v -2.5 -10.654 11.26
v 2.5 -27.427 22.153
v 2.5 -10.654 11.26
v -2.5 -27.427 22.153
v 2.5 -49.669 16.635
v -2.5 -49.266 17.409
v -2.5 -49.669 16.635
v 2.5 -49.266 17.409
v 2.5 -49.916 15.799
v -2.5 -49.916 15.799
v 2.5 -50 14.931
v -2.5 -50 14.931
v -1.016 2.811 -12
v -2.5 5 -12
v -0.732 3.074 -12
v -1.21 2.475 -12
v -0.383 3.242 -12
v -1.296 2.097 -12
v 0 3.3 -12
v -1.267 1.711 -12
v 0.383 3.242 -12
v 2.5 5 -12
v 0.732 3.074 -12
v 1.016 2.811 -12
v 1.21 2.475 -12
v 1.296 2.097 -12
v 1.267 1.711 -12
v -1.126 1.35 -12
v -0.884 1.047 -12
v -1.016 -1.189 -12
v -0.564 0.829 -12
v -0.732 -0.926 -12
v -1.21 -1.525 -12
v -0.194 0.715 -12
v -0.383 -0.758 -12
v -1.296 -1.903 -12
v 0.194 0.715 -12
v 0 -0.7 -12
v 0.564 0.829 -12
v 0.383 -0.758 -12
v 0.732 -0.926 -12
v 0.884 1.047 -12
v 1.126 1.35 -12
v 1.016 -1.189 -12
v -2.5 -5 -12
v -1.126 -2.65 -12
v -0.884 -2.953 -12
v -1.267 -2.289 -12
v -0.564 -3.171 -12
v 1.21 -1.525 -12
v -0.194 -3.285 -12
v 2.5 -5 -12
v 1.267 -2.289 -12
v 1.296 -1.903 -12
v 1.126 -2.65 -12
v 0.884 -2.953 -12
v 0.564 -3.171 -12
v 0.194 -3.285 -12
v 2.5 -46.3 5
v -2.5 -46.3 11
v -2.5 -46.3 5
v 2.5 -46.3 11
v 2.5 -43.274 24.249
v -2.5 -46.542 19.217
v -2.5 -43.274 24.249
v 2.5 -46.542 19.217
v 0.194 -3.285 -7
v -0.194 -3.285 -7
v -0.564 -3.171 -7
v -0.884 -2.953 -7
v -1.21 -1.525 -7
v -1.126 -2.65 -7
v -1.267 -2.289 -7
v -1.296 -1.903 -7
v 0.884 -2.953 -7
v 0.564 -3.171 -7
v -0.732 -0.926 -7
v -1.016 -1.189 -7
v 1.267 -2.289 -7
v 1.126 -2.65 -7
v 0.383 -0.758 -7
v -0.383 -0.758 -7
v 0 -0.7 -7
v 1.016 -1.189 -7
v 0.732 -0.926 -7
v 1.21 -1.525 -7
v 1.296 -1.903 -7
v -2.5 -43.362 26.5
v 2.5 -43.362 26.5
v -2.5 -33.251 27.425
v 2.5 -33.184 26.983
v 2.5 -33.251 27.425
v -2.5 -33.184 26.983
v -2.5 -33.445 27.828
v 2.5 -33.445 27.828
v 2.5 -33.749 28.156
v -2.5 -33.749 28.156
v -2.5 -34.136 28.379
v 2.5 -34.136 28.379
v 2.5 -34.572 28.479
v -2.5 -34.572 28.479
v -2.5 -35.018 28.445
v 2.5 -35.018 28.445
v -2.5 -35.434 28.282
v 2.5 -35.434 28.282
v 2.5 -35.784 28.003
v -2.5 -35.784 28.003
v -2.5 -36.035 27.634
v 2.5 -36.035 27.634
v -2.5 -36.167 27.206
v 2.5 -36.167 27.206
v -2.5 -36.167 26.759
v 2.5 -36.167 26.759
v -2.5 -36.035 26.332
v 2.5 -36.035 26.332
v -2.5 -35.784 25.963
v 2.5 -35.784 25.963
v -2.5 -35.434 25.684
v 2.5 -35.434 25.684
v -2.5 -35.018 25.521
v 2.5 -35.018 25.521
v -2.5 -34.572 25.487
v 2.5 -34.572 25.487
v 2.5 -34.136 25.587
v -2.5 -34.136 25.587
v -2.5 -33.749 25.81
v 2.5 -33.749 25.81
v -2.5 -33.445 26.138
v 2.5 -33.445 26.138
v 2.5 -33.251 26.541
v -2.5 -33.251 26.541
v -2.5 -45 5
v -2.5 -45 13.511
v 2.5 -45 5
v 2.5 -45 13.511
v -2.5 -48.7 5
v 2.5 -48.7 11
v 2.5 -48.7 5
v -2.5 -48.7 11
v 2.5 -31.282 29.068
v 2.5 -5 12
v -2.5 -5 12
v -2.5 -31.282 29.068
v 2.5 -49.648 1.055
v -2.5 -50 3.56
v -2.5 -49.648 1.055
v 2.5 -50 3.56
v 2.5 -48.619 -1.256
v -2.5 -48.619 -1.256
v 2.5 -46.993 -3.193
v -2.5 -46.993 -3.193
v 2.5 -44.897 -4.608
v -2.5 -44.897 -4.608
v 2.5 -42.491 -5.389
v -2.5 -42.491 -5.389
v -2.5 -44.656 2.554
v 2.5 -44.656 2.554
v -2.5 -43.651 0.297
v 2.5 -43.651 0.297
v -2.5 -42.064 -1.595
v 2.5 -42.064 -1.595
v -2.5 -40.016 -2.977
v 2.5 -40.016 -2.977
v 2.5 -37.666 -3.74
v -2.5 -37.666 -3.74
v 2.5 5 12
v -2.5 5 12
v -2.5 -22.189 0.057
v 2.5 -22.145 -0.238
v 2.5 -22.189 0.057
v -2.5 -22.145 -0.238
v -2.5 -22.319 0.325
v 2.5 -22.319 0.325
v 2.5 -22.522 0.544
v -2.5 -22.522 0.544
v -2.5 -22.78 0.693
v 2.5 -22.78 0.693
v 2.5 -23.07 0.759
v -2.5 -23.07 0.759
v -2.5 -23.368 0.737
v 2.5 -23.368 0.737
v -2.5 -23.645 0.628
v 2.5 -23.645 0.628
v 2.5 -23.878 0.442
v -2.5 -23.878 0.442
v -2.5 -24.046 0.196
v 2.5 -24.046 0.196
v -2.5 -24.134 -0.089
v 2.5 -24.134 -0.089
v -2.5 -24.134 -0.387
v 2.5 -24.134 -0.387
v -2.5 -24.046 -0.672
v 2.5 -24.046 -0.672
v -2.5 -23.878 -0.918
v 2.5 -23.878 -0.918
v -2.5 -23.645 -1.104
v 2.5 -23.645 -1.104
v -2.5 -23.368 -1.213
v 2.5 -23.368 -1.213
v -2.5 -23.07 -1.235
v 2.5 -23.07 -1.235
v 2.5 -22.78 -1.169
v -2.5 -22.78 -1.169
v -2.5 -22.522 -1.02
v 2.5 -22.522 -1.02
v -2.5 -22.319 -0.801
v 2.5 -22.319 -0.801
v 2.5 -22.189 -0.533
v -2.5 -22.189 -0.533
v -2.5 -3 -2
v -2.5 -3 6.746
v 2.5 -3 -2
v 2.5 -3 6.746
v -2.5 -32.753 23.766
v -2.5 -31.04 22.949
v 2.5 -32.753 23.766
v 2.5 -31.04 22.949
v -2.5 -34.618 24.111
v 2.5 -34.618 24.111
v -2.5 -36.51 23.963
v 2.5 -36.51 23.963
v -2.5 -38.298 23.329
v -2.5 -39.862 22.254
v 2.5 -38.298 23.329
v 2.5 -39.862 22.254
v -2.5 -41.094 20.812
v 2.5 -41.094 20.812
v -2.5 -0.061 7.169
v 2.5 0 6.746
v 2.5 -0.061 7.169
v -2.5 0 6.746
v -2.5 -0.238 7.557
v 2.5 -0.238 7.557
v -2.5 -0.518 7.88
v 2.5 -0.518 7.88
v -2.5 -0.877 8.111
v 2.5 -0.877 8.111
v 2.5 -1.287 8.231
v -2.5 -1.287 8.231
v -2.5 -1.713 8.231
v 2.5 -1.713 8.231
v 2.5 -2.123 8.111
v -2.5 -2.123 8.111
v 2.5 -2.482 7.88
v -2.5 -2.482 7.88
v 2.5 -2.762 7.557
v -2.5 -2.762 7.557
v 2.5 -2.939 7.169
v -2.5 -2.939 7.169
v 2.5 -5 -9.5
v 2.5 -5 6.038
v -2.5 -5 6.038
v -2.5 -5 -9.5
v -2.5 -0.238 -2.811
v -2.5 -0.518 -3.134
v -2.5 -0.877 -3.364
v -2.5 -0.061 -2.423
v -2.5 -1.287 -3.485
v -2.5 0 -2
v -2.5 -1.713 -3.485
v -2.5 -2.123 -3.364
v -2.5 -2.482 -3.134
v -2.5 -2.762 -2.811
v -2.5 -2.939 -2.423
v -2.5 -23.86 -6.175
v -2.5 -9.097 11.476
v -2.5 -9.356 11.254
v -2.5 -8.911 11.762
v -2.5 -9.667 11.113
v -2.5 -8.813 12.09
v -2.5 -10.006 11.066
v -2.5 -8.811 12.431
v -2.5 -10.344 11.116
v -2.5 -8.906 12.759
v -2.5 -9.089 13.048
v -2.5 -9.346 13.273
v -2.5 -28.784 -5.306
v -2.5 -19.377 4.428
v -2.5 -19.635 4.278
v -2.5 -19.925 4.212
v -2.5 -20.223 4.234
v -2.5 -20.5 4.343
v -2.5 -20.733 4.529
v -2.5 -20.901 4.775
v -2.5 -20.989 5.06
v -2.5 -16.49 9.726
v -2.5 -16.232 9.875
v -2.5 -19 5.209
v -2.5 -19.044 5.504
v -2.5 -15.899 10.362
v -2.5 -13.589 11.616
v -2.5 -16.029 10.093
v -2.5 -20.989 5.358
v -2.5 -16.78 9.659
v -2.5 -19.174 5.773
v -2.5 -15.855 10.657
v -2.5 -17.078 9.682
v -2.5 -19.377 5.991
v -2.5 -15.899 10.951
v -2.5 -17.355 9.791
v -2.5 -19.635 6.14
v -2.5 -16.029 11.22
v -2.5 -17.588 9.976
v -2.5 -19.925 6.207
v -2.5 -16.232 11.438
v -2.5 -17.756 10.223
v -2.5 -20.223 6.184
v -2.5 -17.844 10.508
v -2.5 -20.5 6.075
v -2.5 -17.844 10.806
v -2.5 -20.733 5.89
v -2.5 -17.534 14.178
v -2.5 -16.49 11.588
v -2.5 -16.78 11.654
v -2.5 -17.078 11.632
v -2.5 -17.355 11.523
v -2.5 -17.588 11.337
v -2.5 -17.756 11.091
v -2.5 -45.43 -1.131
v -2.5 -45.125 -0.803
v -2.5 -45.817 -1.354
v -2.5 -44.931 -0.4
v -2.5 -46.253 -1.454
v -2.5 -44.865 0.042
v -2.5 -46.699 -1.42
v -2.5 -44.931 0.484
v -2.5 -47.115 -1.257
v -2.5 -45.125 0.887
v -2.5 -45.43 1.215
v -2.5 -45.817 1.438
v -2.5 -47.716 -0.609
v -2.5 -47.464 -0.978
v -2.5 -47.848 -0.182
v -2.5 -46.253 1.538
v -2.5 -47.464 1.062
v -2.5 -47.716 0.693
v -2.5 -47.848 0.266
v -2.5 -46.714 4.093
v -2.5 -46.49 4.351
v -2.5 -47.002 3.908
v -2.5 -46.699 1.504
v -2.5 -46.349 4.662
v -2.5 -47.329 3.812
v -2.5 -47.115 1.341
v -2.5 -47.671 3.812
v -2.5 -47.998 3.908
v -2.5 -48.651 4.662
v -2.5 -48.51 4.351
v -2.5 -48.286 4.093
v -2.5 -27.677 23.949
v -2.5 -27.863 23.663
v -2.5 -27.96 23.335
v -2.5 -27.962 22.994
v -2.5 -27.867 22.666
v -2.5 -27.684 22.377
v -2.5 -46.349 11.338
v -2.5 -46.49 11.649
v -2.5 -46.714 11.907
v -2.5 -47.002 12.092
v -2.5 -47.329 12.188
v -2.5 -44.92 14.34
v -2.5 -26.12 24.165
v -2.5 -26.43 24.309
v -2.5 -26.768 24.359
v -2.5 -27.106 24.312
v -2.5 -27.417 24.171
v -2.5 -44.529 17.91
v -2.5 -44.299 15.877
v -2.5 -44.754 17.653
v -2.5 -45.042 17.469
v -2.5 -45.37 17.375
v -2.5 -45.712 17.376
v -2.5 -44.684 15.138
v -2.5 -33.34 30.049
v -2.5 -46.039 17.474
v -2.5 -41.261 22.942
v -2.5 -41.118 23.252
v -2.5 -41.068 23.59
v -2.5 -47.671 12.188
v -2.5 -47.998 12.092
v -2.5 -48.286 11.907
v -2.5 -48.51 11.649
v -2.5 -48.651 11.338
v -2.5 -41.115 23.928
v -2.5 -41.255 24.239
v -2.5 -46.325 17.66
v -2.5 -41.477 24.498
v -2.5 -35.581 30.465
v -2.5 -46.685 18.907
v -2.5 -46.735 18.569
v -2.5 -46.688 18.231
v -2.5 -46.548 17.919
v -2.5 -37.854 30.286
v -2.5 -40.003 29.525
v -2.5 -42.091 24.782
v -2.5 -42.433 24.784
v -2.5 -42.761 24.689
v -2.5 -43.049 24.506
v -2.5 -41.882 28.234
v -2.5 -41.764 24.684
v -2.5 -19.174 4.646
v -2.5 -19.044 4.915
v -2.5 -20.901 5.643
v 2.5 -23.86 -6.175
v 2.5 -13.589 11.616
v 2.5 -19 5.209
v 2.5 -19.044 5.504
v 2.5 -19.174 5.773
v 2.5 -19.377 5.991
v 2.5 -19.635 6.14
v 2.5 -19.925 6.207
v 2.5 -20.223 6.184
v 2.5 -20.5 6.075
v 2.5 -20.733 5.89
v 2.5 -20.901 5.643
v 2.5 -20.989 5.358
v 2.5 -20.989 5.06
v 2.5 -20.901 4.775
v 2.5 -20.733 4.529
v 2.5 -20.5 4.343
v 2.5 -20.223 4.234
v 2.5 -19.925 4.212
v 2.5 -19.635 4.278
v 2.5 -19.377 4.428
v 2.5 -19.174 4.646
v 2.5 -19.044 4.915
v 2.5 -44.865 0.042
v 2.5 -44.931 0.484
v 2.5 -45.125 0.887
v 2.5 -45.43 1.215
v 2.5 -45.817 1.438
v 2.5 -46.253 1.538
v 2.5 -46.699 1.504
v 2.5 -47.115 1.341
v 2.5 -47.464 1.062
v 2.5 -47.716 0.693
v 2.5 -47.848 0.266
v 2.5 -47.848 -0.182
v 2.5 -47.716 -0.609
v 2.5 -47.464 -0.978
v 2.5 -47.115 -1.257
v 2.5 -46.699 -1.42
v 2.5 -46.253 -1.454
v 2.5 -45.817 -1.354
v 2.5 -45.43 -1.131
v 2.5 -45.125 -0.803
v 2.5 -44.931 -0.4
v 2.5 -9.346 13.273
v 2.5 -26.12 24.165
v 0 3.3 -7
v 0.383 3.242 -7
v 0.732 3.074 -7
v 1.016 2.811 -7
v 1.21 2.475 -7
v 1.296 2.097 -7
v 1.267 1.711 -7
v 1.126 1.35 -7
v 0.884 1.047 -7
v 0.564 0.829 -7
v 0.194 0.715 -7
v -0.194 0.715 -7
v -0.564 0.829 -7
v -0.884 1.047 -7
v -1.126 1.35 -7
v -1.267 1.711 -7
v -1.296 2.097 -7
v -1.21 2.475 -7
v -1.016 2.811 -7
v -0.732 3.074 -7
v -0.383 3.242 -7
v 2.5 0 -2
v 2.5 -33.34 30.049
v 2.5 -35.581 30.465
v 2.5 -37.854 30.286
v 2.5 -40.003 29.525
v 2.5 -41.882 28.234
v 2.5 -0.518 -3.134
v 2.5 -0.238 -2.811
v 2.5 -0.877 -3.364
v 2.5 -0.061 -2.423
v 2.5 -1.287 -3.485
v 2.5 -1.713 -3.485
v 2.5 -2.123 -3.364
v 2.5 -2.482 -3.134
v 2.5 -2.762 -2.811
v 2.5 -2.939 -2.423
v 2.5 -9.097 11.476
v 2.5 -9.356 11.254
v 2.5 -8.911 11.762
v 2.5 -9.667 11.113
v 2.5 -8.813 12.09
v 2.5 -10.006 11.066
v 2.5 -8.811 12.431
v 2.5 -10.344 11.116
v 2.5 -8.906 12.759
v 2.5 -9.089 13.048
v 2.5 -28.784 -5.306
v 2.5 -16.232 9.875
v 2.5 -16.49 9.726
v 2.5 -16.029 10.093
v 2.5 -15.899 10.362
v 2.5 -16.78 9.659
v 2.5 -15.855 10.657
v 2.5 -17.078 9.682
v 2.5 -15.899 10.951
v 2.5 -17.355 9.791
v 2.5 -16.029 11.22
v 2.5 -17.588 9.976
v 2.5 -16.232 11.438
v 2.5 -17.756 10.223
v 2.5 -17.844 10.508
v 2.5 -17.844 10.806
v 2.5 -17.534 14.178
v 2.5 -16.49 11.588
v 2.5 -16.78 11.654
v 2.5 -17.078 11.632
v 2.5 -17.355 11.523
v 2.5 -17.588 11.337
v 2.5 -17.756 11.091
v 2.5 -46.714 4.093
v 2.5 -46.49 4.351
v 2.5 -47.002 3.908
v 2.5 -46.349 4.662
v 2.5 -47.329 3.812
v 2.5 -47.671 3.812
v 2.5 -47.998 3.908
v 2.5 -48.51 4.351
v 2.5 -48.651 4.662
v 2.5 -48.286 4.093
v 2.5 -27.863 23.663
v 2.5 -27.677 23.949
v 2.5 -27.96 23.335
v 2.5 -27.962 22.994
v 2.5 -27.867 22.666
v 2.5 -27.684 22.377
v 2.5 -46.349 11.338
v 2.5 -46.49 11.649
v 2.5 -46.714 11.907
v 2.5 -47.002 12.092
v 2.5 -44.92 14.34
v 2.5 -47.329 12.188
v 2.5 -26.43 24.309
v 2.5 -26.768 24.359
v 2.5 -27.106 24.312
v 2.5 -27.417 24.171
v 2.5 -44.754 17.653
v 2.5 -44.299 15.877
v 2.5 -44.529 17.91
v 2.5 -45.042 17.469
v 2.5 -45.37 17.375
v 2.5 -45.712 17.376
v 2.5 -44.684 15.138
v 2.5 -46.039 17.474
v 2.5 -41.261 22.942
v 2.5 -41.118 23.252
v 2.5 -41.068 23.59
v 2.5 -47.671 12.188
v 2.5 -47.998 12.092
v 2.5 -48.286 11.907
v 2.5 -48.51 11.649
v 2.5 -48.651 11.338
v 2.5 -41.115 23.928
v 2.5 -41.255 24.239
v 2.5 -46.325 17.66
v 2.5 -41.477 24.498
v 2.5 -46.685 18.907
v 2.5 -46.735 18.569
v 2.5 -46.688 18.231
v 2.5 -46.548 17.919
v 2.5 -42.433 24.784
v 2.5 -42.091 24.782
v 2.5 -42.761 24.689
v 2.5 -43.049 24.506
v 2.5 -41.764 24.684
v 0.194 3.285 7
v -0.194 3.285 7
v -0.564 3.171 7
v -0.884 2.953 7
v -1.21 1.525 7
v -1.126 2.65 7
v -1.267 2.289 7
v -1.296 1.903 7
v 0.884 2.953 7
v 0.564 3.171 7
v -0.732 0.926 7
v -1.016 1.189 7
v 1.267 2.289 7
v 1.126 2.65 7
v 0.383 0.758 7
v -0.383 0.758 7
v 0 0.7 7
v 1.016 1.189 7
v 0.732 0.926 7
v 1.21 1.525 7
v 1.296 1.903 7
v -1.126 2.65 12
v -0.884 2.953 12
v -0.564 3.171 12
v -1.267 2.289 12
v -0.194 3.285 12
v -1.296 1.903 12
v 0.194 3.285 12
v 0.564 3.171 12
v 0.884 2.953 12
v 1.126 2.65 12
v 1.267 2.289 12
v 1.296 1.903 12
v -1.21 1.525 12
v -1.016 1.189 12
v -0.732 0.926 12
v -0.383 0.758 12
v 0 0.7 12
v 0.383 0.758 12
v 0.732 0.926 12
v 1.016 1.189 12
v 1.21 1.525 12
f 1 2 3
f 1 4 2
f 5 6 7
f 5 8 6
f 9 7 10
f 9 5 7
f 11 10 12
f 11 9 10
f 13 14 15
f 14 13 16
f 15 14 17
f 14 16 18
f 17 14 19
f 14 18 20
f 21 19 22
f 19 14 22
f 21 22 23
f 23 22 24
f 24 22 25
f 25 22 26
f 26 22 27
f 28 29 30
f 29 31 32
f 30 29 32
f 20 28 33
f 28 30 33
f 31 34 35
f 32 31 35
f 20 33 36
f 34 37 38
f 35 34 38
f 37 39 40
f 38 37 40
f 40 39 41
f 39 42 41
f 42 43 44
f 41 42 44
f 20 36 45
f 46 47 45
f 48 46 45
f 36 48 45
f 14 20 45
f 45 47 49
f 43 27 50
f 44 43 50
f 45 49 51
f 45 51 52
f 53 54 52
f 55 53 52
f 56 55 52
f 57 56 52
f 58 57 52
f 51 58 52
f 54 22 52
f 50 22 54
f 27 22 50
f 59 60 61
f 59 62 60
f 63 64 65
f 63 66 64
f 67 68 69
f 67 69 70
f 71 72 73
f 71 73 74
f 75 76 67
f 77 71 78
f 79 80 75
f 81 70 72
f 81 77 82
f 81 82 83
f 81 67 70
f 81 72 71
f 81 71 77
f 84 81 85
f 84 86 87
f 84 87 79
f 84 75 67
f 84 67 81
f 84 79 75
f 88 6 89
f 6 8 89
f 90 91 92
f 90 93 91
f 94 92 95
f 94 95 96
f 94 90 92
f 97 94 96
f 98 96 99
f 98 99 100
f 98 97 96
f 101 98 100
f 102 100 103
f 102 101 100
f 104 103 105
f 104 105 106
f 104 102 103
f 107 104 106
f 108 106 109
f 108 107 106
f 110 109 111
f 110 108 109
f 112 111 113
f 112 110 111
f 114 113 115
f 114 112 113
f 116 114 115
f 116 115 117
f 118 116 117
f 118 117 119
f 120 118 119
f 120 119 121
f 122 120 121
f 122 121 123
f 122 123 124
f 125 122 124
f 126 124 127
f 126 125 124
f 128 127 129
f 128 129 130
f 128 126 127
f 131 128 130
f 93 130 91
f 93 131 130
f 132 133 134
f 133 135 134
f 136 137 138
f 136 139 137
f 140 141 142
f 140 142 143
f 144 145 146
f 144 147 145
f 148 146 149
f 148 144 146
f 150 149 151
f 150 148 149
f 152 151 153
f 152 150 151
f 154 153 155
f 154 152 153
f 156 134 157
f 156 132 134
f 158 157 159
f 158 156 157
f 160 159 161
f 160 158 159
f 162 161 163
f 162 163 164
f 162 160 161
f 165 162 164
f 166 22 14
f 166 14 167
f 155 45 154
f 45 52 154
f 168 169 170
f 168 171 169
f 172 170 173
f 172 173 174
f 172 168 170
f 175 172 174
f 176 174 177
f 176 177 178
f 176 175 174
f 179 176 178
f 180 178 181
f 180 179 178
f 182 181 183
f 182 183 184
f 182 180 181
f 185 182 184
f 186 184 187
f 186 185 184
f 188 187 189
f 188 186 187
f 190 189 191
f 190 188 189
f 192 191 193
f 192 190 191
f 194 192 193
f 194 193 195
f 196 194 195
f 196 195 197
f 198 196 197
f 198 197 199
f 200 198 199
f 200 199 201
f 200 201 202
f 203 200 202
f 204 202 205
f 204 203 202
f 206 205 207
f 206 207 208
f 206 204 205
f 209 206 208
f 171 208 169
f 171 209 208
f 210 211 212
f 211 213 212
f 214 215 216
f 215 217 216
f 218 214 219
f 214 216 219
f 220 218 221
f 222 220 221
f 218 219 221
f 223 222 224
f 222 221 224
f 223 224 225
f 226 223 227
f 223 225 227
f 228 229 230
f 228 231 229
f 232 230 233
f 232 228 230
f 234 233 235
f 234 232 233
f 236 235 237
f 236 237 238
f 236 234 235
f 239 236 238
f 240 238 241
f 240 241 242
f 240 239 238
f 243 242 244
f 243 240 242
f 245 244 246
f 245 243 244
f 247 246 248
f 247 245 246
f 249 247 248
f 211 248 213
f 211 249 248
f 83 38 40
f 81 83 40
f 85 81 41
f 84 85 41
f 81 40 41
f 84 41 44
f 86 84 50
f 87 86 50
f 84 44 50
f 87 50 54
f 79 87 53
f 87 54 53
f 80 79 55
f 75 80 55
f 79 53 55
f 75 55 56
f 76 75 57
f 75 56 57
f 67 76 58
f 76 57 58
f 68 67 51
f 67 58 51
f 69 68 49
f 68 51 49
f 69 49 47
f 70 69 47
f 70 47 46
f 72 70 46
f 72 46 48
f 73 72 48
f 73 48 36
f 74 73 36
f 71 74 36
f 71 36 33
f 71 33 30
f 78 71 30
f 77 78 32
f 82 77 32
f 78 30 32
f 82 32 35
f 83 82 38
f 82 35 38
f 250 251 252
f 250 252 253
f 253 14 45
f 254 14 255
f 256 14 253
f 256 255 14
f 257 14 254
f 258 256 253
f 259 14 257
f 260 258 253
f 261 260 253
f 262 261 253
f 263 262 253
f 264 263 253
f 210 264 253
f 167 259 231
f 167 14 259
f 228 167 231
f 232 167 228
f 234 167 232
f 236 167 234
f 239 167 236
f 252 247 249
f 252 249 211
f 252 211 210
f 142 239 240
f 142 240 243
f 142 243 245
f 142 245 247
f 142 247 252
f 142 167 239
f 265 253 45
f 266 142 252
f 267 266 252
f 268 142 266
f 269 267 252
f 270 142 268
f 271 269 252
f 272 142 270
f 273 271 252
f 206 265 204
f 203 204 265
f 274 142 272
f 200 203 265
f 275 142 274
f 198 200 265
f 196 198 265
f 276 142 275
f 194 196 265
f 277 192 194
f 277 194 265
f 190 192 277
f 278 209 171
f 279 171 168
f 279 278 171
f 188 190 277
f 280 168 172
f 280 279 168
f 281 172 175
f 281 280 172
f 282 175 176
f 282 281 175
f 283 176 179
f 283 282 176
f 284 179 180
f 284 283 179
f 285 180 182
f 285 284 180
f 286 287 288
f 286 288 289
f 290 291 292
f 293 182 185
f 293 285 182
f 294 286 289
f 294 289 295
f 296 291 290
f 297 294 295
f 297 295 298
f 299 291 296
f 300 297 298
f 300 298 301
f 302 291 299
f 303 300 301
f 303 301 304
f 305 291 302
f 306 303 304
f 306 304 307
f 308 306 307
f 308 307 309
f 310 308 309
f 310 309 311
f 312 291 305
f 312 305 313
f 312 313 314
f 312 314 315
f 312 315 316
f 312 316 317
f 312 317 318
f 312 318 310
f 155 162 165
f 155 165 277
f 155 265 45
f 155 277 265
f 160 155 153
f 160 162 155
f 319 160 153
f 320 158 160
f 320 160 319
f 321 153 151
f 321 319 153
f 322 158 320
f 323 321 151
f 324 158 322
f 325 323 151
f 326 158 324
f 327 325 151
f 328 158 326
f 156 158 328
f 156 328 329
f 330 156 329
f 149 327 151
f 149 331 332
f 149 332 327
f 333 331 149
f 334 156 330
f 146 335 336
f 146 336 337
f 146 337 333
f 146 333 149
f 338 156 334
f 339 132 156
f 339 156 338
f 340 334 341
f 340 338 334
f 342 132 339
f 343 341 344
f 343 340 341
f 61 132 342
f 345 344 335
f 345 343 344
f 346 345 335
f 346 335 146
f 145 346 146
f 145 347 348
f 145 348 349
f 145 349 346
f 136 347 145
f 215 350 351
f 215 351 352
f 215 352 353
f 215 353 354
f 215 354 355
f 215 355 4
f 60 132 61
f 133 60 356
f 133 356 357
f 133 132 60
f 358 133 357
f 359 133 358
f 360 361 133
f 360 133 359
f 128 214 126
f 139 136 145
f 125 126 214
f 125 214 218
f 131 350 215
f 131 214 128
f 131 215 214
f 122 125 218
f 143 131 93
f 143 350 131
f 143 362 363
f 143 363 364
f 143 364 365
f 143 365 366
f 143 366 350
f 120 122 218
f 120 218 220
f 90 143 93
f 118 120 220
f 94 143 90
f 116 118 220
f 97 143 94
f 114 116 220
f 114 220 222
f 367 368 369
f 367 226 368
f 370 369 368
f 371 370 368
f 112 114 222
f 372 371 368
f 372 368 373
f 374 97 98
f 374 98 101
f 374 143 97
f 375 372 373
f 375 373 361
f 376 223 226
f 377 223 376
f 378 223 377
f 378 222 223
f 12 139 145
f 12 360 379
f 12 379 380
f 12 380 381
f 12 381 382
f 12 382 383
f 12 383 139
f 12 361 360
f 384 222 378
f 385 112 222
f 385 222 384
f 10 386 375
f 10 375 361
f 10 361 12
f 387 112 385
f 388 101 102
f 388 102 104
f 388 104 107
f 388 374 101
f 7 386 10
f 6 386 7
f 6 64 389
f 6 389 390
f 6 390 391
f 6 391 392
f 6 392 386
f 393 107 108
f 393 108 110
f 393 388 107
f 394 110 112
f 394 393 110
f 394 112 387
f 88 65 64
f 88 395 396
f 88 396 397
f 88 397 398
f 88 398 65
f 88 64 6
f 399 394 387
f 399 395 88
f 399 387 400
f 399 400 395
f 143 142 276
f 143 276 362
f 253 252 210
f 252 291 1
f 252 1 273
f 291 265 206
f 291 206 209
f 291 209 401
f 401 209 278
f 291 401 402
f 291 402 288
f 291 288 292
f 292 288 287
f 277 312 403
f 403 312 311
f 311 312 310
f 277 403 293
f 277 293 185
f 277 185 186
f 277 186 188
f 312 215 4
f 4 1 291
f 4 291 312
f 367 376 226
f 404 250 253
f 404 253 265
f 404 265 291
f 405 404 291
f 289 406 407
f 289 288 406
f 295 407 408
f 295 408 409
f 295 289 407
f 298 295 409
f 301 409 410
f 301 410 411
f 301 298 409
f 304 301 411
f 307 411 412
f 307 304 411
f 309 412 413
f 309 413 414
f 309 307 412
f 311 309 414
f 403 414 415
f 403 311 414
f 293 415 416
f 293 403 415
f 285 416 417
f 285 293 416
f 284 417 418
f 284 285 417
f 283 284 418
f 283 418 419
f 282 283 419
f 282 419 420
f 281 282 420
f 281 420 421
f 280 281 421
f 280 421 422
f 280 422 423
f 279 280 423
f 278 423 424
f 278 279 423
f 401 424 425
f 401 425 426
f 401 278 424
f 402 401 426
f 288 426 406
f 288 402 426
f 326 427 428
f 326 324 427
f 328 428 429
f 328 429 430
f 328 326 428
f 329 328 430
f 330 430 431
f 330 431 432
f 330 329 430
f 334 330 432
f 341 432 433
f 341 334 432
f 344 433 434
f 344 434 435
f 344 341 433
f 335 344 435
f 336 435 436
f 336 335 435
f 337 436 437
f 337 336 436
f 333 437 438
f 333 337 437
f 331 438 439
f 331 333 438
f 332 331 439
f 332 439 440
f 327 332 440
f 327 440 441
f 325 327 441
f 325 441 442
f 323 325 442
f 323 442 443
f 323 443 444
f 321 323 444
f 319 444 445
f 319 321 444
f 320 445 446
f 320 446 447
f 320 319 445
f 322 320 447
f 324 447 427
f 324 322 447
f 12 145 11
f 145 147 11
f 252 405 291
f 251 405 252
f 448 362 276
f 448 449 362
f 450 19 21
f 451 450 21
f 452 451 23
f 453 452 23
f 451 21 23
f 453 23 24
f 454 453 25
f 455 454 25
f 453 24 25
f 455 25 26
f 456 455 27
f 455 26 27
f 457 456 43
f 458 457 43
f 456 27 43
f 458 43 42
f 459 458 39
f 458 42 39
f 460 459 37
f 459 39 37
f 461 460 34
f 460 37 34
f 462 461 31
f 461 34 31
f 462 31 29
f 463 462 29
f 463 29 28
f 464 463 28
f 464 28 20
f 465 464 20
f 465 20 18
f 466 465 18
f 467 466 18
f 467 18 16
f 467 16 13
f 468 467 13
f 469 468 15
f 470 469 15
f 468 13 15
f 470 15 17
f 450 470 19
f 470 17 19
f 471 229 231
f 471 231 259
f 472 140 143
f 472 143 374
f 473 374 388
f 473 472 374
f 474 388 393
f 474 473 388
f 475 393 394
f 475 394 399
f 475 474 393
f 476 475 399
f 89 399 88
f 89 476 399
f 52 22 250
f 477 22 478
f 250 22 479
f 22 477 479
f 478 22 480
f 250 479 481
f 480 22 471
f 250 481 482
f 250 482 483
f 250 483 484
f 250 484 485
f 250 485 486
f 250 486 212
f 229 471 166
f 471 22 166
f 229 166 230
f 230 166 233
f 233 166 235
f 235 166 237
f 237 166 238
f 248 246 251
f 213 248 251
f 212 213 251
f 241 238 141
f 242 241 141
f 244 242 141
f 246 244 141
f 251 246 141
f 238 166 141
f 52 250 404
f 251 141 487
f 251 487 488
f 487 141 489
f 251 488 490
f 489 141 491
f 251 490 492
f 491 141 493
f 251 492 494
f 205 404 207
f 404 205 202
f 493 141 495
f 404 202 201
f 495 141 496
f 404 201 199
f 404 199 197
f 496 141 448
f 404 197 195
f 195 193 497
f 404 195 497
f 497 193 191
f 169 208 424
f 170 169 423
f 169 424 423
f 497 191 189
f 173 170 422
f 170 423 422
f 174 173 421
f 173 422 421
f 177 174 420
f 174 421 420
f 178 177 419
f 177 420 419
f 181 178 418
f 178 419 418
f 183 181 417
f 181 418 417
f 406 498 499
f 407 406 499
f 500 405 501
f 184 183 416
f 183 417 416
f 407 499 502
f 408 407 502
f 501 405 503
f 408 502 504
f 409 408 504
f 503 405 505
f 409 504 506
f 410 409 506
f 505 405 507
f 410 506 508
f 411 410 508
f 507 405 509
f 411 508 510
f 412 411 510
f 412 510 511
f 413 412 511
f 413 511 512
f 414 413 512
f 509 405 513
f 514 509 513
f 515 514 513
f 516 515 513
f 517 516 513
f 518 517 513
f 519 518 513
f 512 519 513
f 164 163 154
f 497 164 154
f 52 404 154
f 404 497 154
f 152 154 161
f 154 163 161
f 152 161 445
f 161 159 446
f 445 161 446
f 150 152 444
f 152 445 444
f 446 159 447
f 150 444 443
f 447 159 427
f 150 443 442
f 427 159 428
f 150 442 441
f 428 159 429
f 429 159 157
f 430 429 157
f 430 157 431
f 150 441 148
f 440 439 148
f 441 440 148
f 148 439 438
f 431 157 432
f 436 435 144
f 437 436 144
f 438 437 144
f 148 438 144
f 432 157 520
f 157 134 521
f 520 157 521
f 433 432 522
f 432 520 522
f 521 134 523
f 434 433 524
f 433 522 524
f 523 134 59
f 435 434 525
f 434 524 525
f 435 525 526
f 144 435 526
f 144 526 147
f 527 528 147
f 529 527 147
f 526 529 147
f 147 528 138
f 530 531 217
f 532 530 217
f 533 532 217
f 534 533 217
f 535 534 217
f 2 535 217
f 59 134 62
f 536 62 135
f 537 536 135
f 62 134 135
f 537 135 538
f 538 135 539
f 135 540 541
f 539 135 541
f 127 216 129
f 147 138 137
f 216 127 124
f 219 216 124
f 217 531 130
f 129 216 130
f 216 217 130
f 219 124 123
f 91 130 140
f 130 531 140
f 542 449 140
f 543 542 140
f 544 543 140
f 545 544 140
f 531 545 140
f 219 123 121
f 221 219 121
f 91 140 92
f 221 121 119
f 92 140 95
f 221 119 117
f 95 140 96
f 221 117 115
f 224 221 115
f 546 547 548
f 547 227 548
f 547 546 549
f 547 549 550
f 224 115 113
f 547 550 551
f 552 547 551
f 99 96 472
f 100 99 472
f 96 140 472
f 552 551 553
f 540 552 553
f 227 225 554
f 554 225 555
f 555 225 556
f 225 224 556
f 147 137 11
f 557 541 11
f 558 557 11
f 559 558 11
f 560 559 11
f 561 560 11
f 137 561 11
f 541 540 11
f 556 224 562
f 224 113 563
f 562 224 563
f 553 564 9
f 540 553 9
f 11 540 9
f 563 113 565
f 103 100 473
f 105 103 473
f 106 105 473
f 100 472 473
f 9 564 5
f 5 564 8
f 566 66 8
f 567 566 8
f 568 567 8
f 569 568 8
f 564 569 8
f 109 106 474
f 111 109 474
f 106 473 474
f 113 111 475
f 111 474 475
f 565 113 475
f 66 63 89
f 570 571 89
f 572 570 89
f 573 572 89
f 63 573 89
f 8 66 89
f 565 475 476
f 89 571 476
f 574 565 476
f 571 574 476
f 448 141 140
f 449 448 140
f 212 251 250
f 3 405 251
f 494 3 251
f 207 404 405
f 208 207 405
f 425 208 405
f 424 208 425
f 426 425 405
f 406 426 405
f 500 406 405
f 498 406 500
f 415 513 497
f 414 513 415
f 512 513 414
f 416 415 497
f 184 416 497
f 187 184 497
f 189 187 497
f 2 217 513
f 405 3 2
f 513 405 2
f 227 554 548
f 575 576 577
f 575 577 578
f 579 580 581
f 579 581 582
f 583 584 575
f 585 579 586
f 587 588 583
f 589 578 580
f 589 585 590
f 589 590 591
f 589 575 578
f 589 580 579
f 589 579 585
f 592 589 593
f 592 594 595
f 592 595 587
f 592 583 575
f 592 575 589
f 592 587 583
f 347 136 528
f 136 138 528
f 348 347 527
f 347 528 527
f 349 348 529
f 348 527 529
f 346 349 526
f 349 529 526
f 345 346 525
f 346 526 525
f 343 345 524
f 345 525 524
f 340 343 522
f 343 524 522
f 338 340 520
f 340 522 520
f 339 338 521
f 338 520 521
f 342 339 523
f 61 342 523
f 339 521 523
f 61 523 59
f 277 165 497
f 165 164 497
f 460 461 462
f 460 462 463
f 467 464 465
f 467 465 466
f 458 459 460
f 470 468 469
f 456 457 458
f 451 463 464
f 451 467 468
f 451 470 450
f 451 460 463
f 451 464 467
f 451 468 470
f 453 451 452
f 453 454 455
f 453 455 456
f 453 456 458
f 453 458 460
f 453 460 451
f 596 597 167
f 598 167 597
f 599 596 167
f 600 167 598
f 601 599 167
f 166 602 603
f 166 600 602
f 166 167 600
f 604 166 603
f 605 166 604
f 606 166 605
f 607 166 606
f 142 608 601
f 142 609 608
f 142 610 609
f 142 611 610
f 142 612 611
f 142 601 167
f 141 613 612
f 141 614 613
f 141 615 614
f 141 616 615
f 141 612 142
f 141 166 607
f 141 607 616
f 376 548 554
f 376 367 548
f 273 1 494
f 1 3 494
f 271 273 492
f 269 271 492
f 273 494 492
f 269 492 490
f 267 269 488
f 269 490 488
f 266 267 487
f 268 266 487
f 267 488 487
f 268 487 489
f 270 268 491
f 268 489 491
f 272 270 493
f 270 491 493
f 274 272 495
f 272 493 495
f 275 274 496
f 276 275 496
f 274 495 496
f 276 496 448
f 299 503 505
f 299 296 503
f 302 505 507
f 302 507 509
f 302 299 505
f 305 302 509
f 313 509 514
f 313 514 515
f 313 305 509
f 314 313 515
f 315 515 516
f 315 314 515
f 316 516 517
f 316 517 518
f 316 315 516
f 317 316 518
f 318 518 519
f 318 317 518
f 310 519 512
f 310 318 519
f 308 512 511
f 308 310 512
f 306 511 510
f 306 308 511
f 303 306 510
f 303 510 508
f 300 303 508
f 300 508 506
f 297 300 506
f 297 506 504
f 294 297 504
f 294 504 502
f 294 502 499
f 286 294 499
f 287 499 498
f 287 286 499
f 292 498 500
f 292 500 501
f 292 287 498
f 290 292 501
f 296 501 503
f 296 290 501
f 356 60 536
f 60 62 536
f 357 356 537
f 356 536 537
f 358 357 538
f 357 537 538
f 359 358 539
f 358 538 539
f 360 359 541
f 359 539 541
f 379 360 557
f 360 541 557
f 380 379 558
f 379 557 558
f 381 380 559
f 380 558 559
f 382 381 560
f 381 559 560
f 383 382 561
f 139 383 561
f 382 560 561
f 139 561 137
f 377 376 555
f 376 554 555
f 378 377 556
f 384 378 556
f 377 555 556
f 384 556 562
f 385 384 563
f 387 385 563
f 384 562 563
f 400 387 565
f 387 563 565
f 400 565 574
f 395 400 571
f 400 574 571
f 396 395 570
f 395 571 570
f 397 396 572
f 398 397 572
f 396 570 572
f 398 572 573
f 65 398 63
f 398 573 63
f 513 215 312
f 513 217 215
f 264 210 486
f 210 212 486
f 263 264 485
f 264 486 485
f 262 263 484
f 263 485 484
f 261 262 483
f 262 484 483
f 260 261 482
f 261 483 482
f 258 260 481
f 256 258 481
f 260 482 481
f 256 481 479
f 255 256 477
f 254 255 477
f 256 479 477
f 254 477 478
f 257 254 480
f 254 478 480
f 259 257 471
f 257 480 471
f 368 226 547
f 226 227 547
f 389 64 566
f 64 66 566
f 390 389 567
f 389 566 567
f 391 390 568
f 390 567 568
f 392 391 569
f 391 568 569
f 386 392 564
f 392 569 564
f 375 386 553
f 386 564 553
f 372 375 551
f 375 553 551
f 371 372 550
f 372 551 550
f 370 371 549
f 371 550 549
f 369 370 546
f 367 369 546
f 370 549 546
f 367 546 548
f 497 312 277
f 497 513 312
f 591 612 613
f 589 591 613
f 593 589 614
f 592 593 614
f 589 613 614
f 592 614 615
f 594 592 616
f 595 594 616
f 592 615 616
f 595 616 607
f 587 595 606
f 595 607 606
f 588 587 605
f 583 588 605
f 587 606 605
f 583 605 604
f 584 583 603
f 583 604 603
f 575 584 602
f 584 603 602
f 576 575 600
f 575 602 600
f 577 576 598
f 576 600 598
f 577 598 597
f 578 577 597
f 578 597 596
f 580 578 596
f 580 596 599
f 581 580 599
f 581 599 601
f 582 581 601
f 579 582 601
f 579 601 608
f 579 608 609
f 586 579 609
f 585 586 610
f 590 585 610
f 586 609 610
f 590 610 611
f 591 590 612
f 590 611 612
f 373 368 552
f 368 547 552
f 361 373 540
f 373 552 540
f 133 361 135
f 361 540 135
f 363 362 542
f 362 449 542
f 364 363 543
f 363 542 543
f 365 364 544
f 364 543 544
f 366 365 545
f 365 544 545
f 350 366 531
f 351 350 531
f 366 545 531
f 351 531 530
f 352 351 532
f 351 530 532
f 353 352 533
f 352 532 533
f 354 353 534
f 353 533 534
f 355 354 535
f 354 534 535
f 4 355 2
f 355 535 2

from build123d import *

# Parameters (mm, degrees)
SKETCH_R        = 1.5
SKETCH_R_2      = 1
PAD_DEPTH       = 2.5
SKETCH002_R     = 1.3
POCKET001_DEPTH = 5
SKETCH003_R     = 1.3
POCKET002_DEPTH = 5


with BuildPart() as part:
    # Sketch → Pad (new body, symmetric)
    with BuildSketch(Plane.YZ):
        with BuildLine():
            Line((5, -12), (-5, -12))
            Line((-5, -12), (-42.491034, -5.389319))
            ThreePointArc((-50, 3.559518), (-47.874072, -2.281421), (-42.491034, -5.389319))
            Line((-50, 3.559518), (-50, 14.930703))
            ThreePointArc((-49.265951, 17.408811), (-49.81263, 16.222973), (-50, 14.930703))
            Line((-49.265951, 17.408811), (-43.362064, 26.5))
            ThreePointArc((-31.281961, 29.067705), (-37.853802, 30.285724), (-43.362064, 26.5))
            Line((-5, 12), (-31.281961, 29.067705))
            Line((5, 12), (-5, 12))
            Line((5, 12), (5, -9.5))
            Line((5, -12), (5, -9.5))
        make_face()
        with Locations((-34.683969, 26.982892)):
            Circle(SKETCH_R, mode=Mode.SUBTRACT)
        with Locations((-46.364789, 0.041977)):
            Circle(SKETCH_R, mode=Mode.SUBTRACT)
        with Locations((-20, 5.209335)):
            Circle(SKETCH_R_2, mode=Mode.SUBTRACT)
        with Locations((-16.855, 10.656635)):
            Circle(SKETCH_R_2, mode=Mode.SUBTRACT)
        with Locations((-23.145, -0.237965)):
            Circle(SKETCH_R_2, mode=Mode.SUBTRACT)
        Polygon((-5, 6.038184), (-5, -9.5), (-23.859805, -6.174507), (-13.588624, 11.615701), align=None, mode=Mode.SUBTRACT)
        with BuildLine():
            Line((-41.094301, 20.811657), (-44.299169, 15.876592))
            ThreePointArc((-44.299169, 15.876592), (-44.821109, 14.744417), (-45, 13.510627))
            Line((-45, 13.510627), (-45, 5))
            ThreePointArc((-45, 5), (-42.923669, -0.704672), (-37.666214, -3.740065))
            Line((-37.666214, -3.740065), (-28.783844, -5.306267))
            Line((-17.534494, 14.178179), (-28.783844, -5.306267))
            Line((-31.040008, 22.948763), (-17.534494, 14.178179))
            ThreePointArc((-31.040008, 22.948763), (-36.509764, 23.962522), (-41.094301, 20.811657))
        make_face(mode=Mode.SUBTRACT)
        with BuildLine():
            ThreePointArc((-26.119845, 24.165315), (-27.779816, 23.812477), (-27.426978, 22.152506))
            Line((-27.426978, 22.152506), (-10.653567, 11.259725))
            ThreePointArc((-10.653567, 11.259725), (-8.993595, 11.612563), (-9.346433, 13.272534))
            Line((-26.119845, 24.165315), (-9.346433, 13.272534))
        make_face(mode=Mode.SUBTRACT)
        with BuildLine():
            ThreePointArc((-46.541762, 19.216792), (-46.188924, 17.55682), (-44.528953, 17.909658))
            Line((-44.528953, 17.909658), (-41.261119, 22.941682))
            ThreePointArc((-41.261119, 22.941682), (-41.613957, 24.601653), (-43.273928, 24.248815))
            Line((-46.541762, 19.216792), (-43.273928, 24.248815))
        make_face(mode=Mode.SUBTRACT)
        with BuildLine():
            ThreePointArc((-46.3, 11), (-47.5, 12.2), (-48.7, 11))
            Line((-48.7, 11), (-48.7, 5))
            ThreePointArc((-48.7, 5), (-47.5, 3.8), (-46.3, 5))
            Line((-46.3, 11), (-46.3, 5))
        make_face(mode=Mode.SUBTRACT)
        with BuildLine():
            ThreePointArc((0, 6.746165), (-1.5, 8.246165), (-3, 6.746165))
            Line((-3, 6.746165), (-3, -2))
            ThreePointArc((-3, -2), (-1.5, -3.5), (0, -2))
            Line((0, 6.746165), (0, -2))
        make_face(mode=Mode.SUBTRACT)
    extrude(amount=PAD_DEPTH, both=True)

    # Sketch002 (on Face9 of Pad) → Pocket001 (cut)
    with BuildSketch(Plane(origin=(0, 0, 12), x_dir=(0, -1, 0), z_dir=(0, 0, 1))):
        with Locations((-2, 0)):
            Circle(SKETCH002_R)
    extrude(amount=-POCKET001_DEPTH, mode=Mode.SUBTRACT)

    # Sketch003 (on Face1 of Pocket001) → Pocket002 (cut)
    with BuildSketch(Plane.YX.offset(12)):
        with Locations((-2, 0)):
            Circle(SKETCH003_R)
        with Locations((2, 0)):
            Circle(SKETCH003_R)
    extrude(amount=-POCKET002_DEPTH, mode=Mode.SUBTRACT)


solid = part.part
